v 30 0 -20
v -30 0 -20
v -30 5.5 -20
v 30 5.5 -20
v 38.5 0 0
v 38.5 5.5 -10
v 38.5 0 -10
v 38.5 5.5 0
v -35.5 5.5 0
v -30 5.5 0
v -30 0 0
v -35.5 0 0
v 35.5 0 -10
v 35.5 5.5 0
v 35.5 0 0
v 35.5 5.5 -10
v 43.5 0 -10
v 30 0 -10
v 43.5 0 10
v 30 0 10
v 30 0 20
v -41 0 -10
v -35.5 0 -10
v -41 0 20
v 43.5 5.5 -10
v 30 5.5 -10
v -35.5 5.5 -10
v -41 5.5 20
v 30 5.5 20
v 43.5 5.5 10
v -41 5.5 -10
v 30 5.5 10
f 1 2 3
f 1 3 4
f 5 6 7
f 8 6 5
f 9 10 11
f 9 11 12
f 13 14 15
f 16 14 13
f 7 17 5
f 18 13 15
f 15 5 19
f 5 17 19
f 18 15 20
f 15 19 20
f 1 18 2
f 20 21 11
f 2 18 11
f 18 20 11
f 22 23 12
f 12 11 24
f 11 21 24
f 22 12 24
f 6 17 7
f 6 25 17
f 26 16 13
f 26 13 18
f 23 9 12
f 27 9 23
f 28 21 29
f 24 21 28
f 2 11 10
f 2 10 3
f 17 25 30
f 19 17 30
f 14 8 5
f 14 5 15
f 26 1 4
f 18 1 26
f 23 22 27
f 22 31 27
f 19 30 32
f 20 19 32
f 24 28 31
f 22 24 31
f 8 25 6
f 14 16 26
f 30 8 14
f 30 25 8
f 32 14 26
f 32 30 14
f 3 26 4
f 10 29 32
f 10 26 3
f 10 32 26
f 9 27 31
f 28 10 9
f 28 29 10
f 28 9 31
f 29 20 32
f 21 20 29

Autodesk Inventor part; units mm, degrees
ref_plane "YZ Plane" through (0, 0, 0) normal (1, 0, 0) x (0, 1, 0)
ref_plane "XZ Plane" through (0, 0, 0) normal (0, 1, 0) x (-1, 0, 0)
ref_plane "XY Plane" through (0, 0, 0) normal (0, 0, 1) x (1, 0, 0)
sketch "Sketch1" plane through (0, 0, 0) normal (0, 1, 0) x (-1, 0, 0)
  line L0 (30, -20) -> (-30, -20)
  line L1 (-30, -20) -> (-30, 20)
  line L2 (-30, 20) -> (30, 20)
  line L3 (30, 20) -> (30, -20)
  line L4 (30, -20) -> (-30, 20) construction
  line L5 (-30, -20) -> (30, 20) construction
  point P0 (0, 0)
  dimension "d0" = 60
  dimension "d1" = 40
extrude "Extrusion1" add sketch "Sketch1" along normal blind 5.5
sketch "Sketch2" plane through (0, 5.5, 0) normal (0, 1, 0) x (1, 0, 0)
  line L0 (30, -20) -> (30, 20) projected
  line L1 (30, 0) -> (43.5, 0)
  line L2 (43.5, 0) -> (43.5, 10)
  line L3 (43.5, 10) -> (30, 10)
  line L4 (30, 10) -> (30, 0)
  line L5 (-43.1, 0) -> (48.6, 0) projected
  line L6 (43.5, 0) -> (43.5, -10)
  line L7 (43.5, -10) -> (30, -10)
  line L8 (30, -10) -> (30, 0)
  point P0 (0, 0)
  dimension "d4" = 13.5
  dimension "d5" = 10
extrude "Extrusion2" add sketch "Sketch2" against normal blind 5.5
sketch "Sketch3" plane through (0, 5.5, 0) normal (0, 1, 0) x (1, 0, 0)
  line L0 (43.5, 10) -> (30, 10) projected
  line L1 (30, 10) -> (30, 20) projected
  line L2 (35.5, 10) -> (38.5, 10)
  line L3 (38.5, 10) -> (38.5, 0)
  line L4 (38.5, 0) -> (35.5, 0)
  line L5 (35.5, 0) -> (35.5, 10)
  point P0 (0, 0)
  dimension "d8" = 5.5
  dimension "d9" = 3
  dimension "d10" = 10
extrude "Extrusion3" cut sketch "Sketch3" against normal through all
sketch "Sketch4" plane through (0, 5.5, 0) normal (0, 1, 0) x (1, 0, 0)
  line L0 (35.5, 0) -> (35.5, 10) projected
  line L1 (35.5, 10) -> (30, 10) projected
  line L2 (30, 10) -> (30, 20) projected
  line L3 (30, 20) -> (-30, 20) projected
  line L4 (-30, 20) -> (-30, -20) projected
  line L5 (-30, -20) -> (30, -20) projected
  line L6 (30, -20) -> (30, -10) projected
  line L7 (30, -10) -> (43.5, -10) projected
  line L8 (43.5, -10) -> (43.5, 10) projected
  line L9 (43.5, 10) -> (38.5, 10) projected
  line L10 (38.5, 10) -> (38.5, 0) projected
  line L11 (38.5, 0) -> (35.5, 0) projected
  point P0 (0, 0)
sketch "Sketch5" plane through (0, 5.5, 0) normal (0, 1, 0) x (1, 0, 0)
  line L0 (-30, 20) -> (-30, -20) projected
  line L1 (-44.7, 0) -> (58.2, 0) projected
  line L2 (0, 28) -> (0, -28) projected
  line L3 (-30, 0) -> (-41, 0)
  line L4 (-41, 0) -> (-41, 10)
  line L5 (-41, 10) -> (-30, 10)
  line L6 (-30, 10) -> (-30, 0)
  line L7 (-30, 0) -> (-41, 0)
  line L8 (-41, 0) -> (-41, -20)
  line L9 (-41, -20) -> (-30, -20)
  line L10 (-30, -20) -> (-30, 0)
  point P0 (0, 0)
  dimension "d14" = 11
  dimension "d15" = 10
extrude "Extrusion4" add sketch "Sketch5" against normal blind 5.5
sketch "Sketch6" plane through (0, 5.5, 0) normal (0, 1, 0) x (1, 0, 0)
  line L0 (-30, 20) -> (-30, 10) projected
  line L1 (-30, 10) -> (-41, 10) projected
  line L2 (-30, 0) -> (-35.5, 0)
  line L3 (-35.5, 0) -> (-35.5, 10)
  line L4 (-35.5, 10) -> (-30, 10)
  line L5 (-30, 10) -> (-30, 0)
  line L6 (-57.9, 0) -> (60.4, 0) projected
  line L7 (0, 28) -> (0, -28) projected
  point P0 (0, 0)
  dimension "d20" = 0
  dimension "d21" = 5.5
extrude "Extrusion5" cut sketch "Sketch6" against normal through all
equation "\"d2\" = Wt"
equation "\"d6\" = Wt"
equation "\"d8\" = Wt"
equation "\"d11\" = Wt"
equation "\"d14\" = 2 * Wt"
equation "\"d16\" = Wt"
equation "\"d21\" = Wt"
equation "\"d22\" = Wt"
equation "\"Wt\" = 5.5"
properties part number "ex_holder_side" material "Wood (Birch)"
